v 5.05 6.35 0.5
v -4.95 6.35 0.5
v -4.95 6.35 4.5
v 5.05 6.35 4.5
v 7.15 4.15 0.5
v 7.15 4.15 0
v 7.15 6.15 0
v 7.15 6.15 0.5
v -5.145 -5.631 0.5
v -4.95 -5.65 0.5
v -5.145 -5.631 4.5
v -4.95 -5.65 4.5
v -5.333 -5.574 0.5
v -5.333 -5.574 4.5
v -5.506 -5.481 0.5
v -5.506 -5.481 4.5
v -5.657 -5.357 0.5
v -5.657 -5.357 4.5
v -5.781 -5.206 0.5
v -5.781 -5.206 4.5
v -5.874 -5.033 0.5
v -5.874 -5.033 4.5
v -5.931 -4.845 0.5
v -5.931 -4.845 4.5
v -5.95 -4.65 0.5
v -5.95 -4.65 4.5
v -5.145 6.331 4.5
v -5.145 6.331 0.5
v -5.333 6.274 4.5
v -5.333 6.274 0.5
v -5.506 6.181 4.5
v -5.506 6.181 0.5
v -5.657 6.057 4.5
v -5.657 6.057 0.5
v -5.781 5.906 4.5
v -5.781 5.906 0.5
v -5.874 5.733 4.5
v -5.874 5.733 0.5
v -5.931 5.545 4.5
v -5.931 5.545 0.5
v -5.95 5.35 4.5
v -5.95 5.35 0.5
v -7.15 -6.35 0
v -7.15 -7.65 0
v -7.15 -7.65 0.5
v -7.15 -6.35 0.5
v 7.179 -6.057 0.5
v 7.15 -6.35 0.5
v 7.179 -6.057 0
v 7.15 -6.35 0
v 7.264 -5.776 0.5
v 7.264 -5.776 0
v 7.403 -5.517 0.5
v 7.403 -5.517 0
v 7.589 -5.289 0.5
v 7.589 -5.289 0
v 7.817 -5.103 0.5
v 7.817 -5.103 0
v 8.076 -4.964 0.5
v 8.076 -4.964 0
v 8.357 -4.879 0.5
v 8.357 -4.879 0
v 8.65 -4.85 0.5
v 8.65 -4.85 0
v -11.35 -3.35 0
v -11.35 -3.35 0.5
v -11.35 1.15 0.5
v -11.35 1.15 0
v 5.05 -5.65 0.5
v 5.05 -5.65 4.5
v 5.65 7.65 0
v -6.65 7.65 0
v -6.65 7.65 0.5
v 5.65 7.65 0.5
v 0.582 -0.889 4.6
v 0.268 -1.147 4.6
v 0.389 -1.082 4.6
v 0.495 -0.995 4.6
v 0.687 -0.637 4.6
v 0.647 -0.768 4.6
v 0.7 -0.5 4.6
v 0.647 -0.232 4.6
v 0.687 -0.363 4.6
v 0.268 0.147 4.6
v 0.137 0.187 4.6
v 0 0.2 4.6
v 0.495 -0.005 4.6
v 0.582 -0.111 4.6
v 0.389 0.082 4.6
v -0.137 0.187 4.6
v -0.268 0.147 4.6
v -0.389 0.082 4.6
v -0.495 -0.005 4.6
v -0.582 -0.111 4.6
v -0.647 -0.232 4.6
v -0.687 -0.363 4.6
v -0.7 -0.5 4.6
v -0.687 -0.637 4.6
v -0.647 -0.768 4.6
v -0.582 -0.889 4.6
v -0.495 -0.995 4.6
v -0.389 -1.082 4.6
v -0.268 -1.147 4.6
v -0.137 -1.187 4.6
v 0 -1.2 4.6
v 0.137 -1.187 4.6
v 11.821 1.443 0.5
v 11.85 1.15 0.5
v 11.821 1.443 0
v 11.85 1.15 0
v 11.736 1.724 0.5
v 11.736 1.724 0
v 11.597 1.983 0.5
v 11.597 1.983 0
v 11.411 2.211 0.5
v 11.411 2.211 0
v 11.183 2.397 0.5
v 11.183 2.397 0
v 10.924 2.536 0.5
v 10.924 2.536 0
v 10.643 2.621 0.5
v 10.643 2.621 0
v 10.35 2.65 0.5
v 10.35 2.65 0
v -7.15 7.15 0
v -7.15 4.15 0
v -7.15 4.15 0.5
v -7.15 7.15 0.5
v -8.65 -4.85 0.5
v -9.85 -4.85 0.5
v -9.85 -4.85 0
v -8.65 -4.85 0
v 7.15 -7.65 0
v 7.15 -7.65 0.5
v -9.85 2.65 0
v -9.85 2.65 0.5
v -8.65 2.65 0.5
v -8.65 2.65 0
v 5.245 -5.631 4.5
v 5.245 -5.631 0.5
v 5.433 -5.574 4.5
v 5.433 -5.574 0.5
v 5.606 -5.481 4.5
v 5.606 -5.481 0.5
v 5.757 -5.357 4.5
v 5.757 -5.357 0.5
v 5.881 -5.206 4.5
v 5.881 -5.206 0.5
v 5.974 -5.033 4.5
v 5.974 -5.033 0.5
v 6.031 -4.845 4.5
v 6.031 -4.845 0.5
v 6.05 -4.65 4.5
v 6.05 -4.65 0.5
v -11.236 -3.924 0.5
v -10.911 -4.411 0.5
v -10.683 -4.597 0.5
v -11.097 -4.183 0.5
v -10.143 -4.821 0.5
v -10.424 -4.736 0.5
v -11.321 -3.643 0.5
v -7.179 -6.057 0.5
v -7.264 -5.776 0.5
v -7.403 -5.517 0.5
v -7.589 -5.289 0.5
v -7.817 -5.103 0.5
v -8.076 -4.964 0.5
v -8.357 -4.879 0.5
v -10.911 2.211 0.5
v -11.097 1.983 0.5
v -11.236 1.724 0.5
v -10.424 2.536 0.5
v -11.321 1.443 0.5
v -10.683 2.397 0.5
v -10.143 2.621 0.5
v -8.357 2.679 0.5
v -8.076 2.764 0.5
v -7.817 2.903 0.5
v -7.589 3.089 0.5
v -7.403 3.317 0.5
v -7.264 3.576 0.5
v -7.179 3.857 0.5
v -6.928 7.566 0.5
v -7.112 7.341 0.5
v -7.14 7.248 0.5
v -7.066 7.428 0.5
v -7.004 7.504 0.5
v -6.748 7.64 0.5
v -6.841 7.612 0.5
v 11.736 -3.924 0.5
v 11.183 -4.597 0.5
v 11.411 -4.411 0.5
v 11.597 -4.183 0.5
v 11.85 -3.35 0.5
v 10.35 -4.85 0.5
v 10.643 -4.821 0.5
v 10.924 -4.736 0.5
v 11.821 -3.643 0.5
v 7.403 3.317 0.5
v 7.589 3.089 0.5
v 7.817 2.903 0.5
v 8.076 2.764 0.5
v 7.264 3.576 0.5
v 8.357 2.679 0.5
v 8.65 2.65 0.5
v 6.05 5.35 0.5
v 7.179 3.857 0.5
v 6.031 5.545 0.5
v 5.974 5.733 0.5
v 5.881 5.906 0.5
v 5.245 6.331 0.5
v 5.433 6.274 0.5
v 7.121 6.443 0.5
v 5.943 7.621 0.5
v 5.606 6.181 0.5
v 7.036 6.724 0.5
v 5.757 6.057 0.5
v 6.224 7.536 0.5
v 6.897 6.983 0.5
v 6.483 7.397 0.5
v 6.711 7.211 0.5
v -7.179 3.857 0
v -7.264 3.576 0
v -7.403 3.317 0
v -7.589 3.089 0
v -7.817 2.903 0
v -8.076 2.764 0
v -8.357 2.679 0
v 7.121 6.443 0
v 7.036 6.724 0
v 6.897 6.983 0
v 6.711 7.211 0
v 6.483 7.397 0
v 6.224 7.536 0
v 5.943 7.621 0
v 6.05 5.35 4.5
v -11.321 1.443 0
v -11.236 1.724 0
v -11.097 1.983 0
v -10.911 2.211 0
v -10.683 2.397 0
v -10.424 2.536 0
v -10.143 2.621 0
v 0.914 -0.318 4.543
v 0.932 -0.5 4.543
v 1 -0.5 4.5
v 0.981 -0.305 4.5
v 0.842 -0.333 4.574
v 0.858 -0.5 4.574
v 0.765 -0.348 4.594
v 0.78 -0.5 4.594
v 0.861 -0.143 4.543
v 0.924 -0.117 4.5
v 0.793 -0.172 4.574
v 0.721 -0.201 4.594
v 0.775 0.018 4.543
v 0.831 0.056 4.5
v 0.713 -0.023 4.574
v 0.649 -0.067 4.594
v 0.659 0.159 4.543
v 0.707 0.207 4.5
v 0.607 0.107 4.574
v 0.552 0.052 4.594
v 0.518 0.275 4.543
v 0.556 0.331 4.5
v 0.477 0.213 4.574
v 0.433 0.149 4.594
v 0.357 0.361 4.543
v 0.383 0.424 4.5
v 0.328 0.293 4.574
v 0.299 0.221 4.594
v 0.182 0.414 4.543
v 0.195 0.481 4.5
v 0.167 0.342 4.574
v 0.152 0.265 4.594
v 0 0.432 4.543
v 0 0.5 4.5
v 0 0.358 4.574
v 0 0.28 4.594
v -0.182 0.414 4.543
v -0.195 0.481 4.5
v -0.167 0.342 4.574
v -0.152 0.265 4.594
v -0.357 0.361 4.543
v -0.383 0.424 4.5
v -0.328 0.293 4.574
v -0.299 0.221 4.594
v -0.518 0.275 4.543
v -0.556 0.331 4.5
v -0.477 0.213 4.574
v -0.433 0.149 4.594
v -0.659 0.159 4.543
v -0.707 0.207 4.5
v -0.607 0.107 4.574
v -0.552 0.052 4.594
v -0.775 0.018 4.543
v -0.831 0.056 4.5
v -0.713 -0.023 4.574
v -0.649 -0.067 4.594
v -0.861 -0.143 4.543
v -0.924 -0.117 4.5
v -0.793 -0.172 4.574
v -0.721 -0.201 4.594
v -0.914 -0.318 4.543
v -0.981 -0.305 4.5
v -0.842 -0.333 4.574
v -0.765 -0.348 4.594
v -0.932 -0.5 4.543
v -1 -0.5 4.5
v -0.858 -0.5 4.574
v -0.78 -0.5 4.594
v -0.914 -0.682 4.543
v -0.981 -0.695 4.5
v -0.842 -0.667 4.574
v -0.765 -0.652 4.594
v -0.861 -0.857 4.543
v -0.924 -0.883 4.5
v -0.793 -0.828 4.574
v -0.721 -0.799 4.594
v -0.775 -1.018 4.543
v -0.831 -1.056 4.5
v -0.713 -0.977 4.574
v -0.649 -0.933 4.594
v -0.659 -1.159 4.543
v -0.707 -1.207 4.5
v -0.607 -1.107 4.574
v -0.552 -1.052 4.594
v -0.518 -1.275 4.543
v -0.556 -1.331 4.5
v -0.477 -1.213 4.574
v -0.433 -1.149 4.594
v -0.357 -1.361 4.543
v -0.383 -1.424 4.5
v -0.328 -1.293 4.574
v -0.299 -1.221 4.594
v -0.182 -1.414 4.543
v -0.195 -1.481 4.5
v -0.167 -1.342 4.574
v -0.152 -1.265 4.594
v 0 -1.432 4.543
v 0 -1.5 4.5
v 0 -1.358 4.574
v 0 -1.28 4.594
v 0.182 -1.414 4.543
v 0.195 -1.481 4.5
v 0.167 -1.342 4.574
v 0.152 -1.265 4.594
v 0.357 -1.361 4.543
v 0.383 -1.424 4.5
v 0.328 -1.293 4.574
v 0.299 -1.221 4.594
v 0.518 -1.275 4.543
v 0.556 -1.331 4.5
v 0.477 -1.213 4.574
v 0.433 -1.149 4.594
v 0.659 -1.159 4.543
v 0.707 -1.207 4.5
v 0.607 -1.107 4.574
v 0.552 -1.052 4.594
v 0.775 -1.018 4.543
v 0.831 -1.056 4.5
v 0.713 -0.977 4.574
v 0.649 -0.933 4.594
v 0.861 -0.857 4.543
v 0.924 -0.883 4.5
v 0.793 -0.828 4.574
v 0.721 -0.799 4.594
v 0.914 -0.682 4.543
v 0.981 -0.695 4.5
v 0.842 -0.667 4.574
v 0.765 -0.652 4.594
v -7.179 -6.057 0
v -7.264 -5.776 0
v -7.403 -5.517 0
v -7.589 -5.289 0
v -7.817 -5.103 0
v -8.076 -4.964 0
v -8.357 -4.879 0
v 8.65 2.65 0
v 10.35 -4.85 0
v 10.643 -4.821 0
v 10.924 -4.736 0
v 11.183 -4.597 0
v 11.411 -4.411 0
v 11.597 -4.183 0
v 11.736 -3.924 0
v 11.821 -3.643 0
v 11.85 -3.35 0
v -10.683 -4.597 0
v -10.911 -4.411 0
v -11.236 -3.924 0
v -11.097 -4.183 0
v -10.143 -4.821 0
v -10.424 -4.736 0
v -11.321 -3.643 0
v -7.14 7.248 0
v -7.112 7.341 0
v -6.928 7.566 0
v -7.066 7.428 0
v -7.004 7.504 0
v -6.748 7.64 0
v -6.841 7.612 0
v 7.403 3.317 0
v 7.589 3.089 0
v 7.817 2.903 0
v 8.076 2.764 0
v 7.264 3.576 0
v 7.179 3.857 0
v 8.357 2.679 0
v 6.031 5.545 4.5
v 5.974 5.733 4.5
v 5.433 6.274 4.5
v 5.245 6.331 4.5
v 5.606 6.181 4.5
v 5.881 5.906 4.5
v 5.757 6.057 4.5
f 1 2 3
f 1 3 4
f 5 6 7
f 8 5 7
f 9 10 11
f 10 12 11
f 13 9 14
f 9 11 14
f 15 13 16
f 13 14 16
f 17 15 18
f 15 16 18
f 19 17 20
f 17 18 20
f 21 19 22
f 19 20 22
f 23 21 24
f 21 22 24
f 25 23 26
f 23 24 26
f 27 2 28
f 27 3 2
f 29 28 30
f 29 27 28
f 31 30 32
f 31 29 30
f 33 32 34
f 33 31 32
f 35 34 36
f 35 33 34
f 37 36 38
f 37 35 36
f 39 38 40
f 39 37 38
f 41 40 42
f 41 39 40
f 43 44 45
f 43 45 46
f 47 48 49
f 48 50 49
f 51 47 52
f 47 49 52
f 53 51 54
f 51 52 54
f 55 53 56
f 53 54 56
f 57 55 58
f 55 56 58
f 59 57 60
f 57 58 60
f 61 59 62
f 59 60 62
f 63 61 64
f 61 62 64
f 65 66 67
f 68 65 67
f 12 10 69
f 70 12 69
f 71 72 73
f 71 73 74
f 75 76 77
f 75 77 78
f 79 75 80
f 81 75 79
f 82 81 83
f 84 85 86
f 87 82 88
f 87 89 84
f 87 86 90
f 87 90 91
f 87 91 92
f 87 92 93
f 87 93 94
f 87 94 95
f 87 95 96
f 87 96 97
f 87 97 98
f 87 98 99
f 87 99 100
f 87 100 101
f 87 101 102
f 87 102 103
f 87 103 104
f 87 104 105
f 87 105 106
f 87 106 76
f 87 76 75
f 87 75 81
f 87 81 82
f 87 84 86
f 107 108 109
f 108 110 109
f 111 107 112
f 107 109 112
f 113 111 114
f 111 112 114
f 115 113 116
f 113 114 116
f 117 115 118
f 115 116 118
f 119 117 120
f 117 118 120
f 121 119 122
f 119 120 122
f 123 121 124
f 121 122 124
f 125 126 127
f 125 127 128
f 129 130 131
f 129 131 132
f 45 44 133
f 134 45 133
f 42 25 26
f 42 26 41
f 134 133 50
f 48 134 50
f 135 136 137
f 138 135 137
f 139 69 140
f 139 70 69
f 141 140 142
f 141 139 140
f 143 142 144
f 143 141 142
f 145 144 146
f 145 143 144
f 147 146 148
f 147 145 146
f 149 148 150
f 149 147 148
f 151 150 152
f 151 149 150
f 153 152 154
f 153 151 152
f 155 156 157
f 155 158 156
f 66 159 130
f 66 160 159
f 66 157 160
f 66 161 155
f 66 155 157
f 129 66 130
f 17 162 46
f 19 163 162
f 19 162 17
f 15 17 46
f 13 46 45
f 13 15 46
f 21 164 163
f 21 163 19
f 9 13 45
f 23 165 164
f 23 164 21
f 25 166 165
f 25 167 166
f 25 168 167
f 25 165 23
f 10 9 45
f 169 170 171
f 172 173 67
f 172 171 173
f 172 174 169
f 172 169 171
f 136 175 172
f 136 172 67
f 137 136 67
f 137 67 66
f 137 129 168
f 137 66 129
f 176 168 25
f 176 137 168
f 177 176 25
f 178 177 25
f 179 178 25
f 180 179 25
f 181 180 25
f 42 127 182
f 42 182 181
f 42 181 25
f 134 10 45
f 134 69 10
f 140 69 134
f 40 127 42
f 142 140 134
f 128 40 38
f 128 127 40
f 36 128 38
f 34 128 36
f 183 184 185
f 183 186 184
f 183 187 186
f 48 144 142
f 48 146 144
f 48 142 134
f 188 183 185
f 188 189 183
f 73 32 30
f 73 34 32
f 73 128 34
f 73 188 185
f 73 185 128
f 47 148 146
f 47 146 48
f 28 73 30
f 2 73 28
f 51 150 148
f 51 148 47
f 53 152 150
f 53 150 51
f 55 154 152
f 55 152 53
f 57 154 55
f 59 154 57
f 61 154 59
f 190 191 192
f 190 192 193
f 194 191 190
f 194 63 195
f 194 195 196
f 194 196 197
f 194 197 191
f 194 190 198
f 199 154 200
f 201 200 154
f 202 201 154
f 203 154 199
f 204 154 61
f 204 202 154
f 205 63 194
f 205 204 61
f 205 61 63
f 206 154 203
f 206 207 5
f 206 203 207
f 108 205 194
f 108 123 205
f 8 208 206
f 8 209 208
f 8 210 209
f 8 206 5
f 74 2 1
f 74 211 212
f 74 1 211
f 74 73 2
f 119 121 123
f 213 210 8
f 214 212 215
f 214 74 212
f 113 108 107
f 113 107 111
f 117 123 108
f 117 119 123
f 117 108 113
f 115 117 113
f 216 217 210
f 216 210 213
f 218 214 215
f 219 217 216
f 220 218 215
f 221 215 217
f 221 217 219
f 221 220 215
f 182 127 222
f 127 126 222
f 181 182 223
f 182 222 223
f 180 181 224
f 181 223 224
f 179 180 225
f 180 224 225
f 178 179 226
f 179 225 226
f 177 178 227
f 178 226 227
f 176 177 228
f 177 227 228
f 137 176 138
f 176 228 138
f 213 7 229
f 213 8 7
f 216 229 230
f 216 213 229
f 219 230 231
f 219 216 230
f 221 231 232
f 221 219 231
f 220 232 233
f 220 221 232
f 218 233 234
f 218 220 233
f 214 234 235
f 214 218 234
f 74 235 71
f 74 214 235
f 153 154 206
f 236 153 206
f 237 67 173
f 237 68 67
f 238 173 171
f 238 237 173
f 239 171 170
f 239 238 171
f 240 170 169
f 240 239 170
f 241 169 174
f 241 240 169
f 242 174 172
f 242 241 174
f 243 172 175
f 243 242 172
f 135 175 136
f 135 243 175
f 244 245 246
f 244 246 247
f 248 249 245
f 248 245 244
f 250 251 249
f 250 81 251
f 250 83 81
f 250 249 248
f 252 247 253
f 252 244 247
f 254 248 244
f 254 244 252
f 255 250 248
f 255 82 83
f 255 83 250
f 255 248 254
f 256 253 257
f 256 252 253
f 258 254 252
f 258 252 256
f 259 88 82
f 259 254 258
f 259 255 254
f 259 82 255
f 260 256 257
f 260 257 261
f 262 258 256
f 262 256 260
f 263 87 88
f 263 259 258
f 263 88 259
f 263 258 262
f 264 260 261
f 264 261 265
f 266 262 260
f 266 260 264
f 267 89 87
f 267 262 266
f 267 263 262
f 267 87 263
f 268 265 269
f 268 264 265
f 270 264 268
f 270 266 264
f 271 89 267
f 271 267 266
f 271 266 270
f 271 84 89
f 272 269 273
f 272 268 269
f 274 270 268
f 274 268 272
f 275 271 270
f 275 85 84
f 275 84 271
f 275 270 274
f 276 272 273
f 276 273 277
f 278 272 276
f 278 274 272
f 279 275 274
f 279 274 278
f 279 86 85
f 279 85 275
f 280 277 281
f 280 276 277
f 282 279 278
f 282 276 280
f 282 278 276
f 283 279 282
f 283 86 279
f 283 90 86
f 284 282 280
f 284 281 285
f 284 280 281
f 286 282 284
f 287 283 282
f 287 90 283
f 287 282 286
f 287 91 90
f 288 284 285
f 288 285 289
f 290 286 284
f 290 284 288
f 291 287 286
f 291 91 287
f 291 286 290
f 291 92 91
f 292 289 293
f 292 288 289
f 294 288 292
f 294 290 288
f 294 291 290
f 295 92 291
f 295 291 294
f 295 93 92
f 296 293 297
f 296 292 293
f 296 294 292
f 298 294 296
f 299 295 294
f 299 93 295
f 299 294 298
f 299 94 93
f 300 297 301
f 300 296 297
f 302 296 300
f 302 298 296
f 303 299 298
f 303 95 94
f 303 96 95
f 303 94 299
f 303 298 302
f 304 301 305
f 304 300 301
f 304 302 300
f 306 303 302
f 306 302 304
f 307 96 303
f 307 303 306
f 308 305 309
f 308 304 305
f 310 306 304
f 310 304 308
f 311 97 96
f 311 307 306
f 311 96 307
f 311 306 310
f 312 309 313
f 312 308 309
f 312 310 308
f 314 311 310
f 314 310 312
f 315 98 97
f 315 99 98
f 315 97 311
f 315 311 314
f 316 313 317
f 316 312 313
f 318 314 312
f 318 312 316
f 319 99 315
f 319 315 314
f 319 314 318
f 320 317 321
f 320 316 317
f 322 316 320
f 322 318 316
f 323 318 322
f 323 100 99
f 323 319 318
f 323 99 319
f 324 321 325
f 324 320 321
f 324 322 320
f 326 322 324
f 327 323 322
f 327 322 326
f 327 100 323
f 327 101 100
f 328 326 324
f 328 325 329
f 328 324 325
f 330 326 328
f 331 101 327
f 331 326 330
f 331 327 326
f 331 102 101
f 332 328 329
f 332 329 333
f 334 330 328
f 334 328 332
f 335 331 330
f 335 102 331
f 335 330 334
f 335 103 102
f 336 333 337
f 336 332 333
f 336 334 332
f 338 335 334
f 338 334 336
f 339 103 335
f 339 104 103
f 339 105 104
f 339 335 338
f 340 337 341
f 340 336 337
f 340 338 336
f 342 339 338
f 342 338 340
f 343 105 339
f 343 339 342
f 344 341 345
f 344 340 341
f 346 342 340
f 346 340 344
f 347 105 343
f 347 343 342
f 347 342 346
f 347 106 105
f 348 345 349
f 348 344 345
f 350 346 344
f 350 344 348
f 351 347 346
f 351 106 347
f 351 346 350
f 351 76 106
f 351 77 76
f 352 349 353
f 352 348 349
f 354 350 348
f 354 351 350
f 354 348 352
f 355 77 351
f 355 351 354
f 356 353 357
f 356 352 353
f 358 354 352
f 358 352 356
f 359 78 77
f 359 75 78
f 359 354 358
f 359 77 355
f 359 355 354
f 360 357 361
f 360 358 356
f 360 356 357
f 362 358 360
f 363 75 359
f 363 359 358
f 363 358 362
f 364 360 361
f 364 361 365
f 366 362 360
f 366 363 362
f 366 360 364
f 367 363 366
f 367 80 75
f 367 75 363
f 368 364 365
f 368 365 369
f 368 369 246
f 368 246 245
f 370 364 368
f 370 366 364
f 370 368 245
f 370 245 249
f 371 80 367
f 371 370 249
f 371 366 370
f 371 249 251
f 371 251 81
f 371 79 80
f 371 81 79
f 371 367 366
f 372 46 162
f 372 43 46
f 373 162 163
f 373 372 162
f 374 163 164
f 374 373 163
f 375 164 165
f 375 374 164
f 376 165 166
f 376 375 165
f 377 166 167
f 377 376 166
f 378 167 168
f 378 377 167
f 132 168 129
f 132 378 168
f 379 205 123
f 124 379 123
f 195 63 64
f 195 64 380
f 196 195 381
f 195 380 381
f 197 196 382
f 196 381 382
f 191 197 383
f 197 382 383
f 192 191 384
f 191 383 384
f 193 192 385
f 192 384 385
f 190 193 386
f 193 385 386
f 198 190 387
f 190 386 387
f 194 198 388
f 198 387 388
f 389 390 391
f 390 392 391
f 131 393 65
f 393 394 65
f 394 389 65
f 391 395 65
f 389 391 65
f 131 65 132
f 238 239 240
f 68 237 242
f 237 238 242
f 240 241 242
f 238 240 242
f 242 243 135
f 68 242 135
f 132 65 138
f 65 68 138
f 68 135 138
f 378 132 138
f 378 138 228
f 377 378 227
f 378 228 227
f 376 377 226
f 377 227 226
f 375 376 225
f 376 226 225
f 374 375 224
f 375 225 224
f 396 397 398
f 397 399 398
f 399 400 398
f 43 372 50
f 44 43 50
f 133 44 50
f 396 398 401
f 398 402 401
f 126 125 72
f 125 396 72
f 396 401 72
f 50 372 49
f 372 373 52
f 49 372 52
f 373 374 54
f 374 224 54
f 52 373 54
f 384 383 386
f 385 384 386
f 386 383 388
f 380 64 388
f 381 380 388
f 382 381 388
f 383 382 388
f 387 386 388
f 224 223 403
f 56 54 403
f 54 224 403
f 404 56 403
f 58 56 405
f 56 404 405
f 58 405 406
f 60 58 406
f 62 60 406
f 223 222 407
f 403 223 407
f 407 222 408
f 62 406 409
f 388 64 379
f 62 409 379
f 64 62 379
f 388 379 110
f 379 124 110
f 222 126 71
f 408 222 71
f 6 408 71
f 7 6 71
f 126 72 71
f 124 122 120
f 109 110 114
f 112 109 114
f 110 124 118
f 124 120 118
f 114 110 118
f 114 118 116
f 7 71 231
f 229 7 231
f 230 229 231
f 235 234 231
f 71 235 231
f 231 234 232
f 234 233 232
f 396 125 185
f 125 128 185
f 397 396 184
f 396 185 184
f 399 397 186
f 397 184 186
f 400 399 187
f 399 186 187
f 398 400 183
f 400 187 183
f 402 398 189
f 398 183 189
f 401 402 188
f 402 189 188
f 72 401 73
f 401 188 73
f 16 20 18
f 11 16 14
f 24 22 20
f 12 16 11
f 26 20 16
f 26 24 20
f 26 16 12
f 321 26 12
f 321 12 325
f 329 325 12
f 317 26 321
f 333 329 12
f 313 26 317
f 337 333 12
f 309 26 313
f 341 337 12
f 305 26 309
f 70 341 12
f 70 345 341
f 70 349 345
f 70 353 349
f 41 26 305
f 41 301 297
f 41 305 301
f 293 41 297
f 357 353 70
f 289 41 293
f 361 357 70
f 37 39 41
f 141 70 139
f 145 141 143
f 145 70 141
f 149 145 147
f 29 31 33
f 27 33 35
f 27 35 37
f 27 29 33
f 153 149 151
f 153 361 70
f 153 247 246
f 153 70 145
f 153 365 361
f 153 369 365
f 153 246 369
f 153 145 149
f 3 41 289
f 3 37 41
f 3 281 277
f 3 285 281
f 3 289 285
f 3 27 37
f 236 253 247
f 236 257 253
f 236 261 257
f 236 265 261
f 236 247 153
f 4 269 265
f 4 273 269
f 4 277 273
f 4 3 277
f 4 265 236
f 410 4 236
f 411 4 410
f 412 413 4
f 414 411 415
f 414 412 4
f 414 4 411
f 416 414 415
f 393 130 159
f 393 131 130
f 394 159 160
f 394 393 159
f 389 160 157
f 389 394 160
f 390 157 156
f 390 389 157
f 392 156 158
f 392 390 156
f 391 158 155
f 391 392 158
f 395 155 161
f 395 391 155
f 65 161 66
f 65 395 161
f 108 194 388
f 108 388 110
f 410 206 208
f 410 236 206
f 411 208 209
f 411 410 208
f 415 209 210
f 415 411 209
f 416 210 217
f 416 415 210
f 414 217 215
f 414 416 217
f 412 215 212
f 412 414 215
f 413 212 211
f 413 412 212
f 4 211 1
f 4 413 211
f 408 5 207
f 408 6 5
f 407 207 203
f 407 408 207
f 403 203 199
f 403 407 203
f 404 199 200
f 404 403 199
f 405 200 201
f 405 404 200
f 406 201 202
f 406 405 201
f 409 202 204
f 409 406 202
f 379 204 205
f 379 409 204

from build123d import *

# Parameters (mm, degrees)
SKETCH_1_W      = 14.3
SKETCH_1_H      = 15.3
EXTRUDE_1_DEPTH = 0.5
SKETCH_2_W      = 4.2
SKETCH_2_H      = 7.5
SKETCH_2_W_2    = 4.7
EXTRUDE_2_DEPTH = 0.5
FILLET_1_R      = 1.5
FILLET_2_R      = 0.5
SKETCH_3_W      = 12
SKETCH_3_H      = 12
EXTRUDE_3_DEPTH = 4
FILLET_3_R      = 1
SKETCH_4_R      = 1
EXTRUDE_4_DEPTH = 0.1
FILLET_4_R      = 0.5


with BuildPart() as part:
    # ｽｹｯﾁ1 → ﾎﾞｽ - 押し出し1 (new body)
    with BuildSketch(Plane.XY):
        Rectangle(SKETCH_1_W, SKETCH_1_H)
    extrude(amount=EXTRUDE_1_DEPTH)

    # ｽｹｯﾁ2 → ﾎﾞｽ - 押し出し2 (add)
    with BuildSketch(Plane.XY.offset(0.5)):
        with Locations((-9.25, -1.1)):
            Rectangle(SKETCH_2_W, SKETCH_2_H)
        with Locations((9.5, -1.1)):
            Rectangle(SKETCH_2_W_2, SKETCH_2_H)
    extrude(amount=-EXTRUDE_2_DEPTH)

    # ﾌｨﾚｯﾄ1
    fillet_1_edges = [part.edges().sort_by_distance(p)[0] for p in [
        (-7.15, 2.65, 0.25),
        (-7.15, -4.85, 0.25),
        (-11.35, -4.85, 0.25),
        (-11.35, 2.65, 0.25),
        (7.15, -4.85, 0.25),
        (7.15, 2.65, 0.25),
        (11.85, 2.65, 0.25),
        (11.85, -4.85, 0.25),
        (7.15, 7.65, 0.25),
    ]]
    fillet(fillet_1_edges, radius=FILLET_1_R)

    # ﾌｨﾚｯﾄ2
    fillet_2_edges = [part.edges().sort_by_distance(p)[0] for p in [
        (-7.15, 7.65, 0.25),
    ]]
    fillet(fillet_2_edges, radius=FILLET_2_R)

    # ｽｹｯﾁ3 → ﾎﾞｽ - 押し出し3 (add)
    with BuildSketch(Plane.XY.offset(0.5)):
        with Locations((0.05, 0.35)):
            Rectangle(SKETCH_3_W, SKETCH_3_H)
    extrude(amount=EXTRUDE_3_DEPTH)

    # ﾌｨﾚｯﾄ3
    fillet_3_edges = [part.edges().sort_by_distance(p)[0] for p in [
        (-5.95, 6.35, 2.5),
        (-5.95, -5.65, 2.5),
        (6.05, -5.65, 2.5),
        (6.05, 6.35, 2.5),
    ]]
    fillet(fillet_3_edges, radius=FILLET_3_R)

    # ｽｹｯﾁ4 → ﾎﾞｽ - 押し出し4 (add)
    with BuildSketch(Plane.XY.offset(4.5)):
        with Locations((0, -0.5)):
            Circle(SKETCH_4_R)
    extrude(amount=EXTRUDE_4_DEPTH)

    # ﾌｨﾚｯﾄ4
    # the kernel refuses this fillet: 0.5 mm, written as the material it takes off along each edge
    with BuildSketch(Plane(origin=(0, -0.5, 4.6), x_dir=(1, 0, 0), z_dir=(0, -1, 0))) as fillet_4_piece_1:
        with BuildLine():
            CenterArc((0.7, -0.5), FILLET_4_R, 53.130102354, 36.869897646)
            Line((0.7, 0), (0.7, 0.01))
            Line((0.7, 0.01), (1, 0.01))
            Line((1, 0.01), (1.01, 0))
            ThreePointArc((1.01, 0), (1.01, -0.05), (1.006, -0.092))
            Line((1.006, -0.092), (1, -0.1))
        make_face()
    revolve(axis=Axis((0, -0.5, 4.6), (0, 0, 1)), mode=Mode.SUBTRACT)


solid = part.part
